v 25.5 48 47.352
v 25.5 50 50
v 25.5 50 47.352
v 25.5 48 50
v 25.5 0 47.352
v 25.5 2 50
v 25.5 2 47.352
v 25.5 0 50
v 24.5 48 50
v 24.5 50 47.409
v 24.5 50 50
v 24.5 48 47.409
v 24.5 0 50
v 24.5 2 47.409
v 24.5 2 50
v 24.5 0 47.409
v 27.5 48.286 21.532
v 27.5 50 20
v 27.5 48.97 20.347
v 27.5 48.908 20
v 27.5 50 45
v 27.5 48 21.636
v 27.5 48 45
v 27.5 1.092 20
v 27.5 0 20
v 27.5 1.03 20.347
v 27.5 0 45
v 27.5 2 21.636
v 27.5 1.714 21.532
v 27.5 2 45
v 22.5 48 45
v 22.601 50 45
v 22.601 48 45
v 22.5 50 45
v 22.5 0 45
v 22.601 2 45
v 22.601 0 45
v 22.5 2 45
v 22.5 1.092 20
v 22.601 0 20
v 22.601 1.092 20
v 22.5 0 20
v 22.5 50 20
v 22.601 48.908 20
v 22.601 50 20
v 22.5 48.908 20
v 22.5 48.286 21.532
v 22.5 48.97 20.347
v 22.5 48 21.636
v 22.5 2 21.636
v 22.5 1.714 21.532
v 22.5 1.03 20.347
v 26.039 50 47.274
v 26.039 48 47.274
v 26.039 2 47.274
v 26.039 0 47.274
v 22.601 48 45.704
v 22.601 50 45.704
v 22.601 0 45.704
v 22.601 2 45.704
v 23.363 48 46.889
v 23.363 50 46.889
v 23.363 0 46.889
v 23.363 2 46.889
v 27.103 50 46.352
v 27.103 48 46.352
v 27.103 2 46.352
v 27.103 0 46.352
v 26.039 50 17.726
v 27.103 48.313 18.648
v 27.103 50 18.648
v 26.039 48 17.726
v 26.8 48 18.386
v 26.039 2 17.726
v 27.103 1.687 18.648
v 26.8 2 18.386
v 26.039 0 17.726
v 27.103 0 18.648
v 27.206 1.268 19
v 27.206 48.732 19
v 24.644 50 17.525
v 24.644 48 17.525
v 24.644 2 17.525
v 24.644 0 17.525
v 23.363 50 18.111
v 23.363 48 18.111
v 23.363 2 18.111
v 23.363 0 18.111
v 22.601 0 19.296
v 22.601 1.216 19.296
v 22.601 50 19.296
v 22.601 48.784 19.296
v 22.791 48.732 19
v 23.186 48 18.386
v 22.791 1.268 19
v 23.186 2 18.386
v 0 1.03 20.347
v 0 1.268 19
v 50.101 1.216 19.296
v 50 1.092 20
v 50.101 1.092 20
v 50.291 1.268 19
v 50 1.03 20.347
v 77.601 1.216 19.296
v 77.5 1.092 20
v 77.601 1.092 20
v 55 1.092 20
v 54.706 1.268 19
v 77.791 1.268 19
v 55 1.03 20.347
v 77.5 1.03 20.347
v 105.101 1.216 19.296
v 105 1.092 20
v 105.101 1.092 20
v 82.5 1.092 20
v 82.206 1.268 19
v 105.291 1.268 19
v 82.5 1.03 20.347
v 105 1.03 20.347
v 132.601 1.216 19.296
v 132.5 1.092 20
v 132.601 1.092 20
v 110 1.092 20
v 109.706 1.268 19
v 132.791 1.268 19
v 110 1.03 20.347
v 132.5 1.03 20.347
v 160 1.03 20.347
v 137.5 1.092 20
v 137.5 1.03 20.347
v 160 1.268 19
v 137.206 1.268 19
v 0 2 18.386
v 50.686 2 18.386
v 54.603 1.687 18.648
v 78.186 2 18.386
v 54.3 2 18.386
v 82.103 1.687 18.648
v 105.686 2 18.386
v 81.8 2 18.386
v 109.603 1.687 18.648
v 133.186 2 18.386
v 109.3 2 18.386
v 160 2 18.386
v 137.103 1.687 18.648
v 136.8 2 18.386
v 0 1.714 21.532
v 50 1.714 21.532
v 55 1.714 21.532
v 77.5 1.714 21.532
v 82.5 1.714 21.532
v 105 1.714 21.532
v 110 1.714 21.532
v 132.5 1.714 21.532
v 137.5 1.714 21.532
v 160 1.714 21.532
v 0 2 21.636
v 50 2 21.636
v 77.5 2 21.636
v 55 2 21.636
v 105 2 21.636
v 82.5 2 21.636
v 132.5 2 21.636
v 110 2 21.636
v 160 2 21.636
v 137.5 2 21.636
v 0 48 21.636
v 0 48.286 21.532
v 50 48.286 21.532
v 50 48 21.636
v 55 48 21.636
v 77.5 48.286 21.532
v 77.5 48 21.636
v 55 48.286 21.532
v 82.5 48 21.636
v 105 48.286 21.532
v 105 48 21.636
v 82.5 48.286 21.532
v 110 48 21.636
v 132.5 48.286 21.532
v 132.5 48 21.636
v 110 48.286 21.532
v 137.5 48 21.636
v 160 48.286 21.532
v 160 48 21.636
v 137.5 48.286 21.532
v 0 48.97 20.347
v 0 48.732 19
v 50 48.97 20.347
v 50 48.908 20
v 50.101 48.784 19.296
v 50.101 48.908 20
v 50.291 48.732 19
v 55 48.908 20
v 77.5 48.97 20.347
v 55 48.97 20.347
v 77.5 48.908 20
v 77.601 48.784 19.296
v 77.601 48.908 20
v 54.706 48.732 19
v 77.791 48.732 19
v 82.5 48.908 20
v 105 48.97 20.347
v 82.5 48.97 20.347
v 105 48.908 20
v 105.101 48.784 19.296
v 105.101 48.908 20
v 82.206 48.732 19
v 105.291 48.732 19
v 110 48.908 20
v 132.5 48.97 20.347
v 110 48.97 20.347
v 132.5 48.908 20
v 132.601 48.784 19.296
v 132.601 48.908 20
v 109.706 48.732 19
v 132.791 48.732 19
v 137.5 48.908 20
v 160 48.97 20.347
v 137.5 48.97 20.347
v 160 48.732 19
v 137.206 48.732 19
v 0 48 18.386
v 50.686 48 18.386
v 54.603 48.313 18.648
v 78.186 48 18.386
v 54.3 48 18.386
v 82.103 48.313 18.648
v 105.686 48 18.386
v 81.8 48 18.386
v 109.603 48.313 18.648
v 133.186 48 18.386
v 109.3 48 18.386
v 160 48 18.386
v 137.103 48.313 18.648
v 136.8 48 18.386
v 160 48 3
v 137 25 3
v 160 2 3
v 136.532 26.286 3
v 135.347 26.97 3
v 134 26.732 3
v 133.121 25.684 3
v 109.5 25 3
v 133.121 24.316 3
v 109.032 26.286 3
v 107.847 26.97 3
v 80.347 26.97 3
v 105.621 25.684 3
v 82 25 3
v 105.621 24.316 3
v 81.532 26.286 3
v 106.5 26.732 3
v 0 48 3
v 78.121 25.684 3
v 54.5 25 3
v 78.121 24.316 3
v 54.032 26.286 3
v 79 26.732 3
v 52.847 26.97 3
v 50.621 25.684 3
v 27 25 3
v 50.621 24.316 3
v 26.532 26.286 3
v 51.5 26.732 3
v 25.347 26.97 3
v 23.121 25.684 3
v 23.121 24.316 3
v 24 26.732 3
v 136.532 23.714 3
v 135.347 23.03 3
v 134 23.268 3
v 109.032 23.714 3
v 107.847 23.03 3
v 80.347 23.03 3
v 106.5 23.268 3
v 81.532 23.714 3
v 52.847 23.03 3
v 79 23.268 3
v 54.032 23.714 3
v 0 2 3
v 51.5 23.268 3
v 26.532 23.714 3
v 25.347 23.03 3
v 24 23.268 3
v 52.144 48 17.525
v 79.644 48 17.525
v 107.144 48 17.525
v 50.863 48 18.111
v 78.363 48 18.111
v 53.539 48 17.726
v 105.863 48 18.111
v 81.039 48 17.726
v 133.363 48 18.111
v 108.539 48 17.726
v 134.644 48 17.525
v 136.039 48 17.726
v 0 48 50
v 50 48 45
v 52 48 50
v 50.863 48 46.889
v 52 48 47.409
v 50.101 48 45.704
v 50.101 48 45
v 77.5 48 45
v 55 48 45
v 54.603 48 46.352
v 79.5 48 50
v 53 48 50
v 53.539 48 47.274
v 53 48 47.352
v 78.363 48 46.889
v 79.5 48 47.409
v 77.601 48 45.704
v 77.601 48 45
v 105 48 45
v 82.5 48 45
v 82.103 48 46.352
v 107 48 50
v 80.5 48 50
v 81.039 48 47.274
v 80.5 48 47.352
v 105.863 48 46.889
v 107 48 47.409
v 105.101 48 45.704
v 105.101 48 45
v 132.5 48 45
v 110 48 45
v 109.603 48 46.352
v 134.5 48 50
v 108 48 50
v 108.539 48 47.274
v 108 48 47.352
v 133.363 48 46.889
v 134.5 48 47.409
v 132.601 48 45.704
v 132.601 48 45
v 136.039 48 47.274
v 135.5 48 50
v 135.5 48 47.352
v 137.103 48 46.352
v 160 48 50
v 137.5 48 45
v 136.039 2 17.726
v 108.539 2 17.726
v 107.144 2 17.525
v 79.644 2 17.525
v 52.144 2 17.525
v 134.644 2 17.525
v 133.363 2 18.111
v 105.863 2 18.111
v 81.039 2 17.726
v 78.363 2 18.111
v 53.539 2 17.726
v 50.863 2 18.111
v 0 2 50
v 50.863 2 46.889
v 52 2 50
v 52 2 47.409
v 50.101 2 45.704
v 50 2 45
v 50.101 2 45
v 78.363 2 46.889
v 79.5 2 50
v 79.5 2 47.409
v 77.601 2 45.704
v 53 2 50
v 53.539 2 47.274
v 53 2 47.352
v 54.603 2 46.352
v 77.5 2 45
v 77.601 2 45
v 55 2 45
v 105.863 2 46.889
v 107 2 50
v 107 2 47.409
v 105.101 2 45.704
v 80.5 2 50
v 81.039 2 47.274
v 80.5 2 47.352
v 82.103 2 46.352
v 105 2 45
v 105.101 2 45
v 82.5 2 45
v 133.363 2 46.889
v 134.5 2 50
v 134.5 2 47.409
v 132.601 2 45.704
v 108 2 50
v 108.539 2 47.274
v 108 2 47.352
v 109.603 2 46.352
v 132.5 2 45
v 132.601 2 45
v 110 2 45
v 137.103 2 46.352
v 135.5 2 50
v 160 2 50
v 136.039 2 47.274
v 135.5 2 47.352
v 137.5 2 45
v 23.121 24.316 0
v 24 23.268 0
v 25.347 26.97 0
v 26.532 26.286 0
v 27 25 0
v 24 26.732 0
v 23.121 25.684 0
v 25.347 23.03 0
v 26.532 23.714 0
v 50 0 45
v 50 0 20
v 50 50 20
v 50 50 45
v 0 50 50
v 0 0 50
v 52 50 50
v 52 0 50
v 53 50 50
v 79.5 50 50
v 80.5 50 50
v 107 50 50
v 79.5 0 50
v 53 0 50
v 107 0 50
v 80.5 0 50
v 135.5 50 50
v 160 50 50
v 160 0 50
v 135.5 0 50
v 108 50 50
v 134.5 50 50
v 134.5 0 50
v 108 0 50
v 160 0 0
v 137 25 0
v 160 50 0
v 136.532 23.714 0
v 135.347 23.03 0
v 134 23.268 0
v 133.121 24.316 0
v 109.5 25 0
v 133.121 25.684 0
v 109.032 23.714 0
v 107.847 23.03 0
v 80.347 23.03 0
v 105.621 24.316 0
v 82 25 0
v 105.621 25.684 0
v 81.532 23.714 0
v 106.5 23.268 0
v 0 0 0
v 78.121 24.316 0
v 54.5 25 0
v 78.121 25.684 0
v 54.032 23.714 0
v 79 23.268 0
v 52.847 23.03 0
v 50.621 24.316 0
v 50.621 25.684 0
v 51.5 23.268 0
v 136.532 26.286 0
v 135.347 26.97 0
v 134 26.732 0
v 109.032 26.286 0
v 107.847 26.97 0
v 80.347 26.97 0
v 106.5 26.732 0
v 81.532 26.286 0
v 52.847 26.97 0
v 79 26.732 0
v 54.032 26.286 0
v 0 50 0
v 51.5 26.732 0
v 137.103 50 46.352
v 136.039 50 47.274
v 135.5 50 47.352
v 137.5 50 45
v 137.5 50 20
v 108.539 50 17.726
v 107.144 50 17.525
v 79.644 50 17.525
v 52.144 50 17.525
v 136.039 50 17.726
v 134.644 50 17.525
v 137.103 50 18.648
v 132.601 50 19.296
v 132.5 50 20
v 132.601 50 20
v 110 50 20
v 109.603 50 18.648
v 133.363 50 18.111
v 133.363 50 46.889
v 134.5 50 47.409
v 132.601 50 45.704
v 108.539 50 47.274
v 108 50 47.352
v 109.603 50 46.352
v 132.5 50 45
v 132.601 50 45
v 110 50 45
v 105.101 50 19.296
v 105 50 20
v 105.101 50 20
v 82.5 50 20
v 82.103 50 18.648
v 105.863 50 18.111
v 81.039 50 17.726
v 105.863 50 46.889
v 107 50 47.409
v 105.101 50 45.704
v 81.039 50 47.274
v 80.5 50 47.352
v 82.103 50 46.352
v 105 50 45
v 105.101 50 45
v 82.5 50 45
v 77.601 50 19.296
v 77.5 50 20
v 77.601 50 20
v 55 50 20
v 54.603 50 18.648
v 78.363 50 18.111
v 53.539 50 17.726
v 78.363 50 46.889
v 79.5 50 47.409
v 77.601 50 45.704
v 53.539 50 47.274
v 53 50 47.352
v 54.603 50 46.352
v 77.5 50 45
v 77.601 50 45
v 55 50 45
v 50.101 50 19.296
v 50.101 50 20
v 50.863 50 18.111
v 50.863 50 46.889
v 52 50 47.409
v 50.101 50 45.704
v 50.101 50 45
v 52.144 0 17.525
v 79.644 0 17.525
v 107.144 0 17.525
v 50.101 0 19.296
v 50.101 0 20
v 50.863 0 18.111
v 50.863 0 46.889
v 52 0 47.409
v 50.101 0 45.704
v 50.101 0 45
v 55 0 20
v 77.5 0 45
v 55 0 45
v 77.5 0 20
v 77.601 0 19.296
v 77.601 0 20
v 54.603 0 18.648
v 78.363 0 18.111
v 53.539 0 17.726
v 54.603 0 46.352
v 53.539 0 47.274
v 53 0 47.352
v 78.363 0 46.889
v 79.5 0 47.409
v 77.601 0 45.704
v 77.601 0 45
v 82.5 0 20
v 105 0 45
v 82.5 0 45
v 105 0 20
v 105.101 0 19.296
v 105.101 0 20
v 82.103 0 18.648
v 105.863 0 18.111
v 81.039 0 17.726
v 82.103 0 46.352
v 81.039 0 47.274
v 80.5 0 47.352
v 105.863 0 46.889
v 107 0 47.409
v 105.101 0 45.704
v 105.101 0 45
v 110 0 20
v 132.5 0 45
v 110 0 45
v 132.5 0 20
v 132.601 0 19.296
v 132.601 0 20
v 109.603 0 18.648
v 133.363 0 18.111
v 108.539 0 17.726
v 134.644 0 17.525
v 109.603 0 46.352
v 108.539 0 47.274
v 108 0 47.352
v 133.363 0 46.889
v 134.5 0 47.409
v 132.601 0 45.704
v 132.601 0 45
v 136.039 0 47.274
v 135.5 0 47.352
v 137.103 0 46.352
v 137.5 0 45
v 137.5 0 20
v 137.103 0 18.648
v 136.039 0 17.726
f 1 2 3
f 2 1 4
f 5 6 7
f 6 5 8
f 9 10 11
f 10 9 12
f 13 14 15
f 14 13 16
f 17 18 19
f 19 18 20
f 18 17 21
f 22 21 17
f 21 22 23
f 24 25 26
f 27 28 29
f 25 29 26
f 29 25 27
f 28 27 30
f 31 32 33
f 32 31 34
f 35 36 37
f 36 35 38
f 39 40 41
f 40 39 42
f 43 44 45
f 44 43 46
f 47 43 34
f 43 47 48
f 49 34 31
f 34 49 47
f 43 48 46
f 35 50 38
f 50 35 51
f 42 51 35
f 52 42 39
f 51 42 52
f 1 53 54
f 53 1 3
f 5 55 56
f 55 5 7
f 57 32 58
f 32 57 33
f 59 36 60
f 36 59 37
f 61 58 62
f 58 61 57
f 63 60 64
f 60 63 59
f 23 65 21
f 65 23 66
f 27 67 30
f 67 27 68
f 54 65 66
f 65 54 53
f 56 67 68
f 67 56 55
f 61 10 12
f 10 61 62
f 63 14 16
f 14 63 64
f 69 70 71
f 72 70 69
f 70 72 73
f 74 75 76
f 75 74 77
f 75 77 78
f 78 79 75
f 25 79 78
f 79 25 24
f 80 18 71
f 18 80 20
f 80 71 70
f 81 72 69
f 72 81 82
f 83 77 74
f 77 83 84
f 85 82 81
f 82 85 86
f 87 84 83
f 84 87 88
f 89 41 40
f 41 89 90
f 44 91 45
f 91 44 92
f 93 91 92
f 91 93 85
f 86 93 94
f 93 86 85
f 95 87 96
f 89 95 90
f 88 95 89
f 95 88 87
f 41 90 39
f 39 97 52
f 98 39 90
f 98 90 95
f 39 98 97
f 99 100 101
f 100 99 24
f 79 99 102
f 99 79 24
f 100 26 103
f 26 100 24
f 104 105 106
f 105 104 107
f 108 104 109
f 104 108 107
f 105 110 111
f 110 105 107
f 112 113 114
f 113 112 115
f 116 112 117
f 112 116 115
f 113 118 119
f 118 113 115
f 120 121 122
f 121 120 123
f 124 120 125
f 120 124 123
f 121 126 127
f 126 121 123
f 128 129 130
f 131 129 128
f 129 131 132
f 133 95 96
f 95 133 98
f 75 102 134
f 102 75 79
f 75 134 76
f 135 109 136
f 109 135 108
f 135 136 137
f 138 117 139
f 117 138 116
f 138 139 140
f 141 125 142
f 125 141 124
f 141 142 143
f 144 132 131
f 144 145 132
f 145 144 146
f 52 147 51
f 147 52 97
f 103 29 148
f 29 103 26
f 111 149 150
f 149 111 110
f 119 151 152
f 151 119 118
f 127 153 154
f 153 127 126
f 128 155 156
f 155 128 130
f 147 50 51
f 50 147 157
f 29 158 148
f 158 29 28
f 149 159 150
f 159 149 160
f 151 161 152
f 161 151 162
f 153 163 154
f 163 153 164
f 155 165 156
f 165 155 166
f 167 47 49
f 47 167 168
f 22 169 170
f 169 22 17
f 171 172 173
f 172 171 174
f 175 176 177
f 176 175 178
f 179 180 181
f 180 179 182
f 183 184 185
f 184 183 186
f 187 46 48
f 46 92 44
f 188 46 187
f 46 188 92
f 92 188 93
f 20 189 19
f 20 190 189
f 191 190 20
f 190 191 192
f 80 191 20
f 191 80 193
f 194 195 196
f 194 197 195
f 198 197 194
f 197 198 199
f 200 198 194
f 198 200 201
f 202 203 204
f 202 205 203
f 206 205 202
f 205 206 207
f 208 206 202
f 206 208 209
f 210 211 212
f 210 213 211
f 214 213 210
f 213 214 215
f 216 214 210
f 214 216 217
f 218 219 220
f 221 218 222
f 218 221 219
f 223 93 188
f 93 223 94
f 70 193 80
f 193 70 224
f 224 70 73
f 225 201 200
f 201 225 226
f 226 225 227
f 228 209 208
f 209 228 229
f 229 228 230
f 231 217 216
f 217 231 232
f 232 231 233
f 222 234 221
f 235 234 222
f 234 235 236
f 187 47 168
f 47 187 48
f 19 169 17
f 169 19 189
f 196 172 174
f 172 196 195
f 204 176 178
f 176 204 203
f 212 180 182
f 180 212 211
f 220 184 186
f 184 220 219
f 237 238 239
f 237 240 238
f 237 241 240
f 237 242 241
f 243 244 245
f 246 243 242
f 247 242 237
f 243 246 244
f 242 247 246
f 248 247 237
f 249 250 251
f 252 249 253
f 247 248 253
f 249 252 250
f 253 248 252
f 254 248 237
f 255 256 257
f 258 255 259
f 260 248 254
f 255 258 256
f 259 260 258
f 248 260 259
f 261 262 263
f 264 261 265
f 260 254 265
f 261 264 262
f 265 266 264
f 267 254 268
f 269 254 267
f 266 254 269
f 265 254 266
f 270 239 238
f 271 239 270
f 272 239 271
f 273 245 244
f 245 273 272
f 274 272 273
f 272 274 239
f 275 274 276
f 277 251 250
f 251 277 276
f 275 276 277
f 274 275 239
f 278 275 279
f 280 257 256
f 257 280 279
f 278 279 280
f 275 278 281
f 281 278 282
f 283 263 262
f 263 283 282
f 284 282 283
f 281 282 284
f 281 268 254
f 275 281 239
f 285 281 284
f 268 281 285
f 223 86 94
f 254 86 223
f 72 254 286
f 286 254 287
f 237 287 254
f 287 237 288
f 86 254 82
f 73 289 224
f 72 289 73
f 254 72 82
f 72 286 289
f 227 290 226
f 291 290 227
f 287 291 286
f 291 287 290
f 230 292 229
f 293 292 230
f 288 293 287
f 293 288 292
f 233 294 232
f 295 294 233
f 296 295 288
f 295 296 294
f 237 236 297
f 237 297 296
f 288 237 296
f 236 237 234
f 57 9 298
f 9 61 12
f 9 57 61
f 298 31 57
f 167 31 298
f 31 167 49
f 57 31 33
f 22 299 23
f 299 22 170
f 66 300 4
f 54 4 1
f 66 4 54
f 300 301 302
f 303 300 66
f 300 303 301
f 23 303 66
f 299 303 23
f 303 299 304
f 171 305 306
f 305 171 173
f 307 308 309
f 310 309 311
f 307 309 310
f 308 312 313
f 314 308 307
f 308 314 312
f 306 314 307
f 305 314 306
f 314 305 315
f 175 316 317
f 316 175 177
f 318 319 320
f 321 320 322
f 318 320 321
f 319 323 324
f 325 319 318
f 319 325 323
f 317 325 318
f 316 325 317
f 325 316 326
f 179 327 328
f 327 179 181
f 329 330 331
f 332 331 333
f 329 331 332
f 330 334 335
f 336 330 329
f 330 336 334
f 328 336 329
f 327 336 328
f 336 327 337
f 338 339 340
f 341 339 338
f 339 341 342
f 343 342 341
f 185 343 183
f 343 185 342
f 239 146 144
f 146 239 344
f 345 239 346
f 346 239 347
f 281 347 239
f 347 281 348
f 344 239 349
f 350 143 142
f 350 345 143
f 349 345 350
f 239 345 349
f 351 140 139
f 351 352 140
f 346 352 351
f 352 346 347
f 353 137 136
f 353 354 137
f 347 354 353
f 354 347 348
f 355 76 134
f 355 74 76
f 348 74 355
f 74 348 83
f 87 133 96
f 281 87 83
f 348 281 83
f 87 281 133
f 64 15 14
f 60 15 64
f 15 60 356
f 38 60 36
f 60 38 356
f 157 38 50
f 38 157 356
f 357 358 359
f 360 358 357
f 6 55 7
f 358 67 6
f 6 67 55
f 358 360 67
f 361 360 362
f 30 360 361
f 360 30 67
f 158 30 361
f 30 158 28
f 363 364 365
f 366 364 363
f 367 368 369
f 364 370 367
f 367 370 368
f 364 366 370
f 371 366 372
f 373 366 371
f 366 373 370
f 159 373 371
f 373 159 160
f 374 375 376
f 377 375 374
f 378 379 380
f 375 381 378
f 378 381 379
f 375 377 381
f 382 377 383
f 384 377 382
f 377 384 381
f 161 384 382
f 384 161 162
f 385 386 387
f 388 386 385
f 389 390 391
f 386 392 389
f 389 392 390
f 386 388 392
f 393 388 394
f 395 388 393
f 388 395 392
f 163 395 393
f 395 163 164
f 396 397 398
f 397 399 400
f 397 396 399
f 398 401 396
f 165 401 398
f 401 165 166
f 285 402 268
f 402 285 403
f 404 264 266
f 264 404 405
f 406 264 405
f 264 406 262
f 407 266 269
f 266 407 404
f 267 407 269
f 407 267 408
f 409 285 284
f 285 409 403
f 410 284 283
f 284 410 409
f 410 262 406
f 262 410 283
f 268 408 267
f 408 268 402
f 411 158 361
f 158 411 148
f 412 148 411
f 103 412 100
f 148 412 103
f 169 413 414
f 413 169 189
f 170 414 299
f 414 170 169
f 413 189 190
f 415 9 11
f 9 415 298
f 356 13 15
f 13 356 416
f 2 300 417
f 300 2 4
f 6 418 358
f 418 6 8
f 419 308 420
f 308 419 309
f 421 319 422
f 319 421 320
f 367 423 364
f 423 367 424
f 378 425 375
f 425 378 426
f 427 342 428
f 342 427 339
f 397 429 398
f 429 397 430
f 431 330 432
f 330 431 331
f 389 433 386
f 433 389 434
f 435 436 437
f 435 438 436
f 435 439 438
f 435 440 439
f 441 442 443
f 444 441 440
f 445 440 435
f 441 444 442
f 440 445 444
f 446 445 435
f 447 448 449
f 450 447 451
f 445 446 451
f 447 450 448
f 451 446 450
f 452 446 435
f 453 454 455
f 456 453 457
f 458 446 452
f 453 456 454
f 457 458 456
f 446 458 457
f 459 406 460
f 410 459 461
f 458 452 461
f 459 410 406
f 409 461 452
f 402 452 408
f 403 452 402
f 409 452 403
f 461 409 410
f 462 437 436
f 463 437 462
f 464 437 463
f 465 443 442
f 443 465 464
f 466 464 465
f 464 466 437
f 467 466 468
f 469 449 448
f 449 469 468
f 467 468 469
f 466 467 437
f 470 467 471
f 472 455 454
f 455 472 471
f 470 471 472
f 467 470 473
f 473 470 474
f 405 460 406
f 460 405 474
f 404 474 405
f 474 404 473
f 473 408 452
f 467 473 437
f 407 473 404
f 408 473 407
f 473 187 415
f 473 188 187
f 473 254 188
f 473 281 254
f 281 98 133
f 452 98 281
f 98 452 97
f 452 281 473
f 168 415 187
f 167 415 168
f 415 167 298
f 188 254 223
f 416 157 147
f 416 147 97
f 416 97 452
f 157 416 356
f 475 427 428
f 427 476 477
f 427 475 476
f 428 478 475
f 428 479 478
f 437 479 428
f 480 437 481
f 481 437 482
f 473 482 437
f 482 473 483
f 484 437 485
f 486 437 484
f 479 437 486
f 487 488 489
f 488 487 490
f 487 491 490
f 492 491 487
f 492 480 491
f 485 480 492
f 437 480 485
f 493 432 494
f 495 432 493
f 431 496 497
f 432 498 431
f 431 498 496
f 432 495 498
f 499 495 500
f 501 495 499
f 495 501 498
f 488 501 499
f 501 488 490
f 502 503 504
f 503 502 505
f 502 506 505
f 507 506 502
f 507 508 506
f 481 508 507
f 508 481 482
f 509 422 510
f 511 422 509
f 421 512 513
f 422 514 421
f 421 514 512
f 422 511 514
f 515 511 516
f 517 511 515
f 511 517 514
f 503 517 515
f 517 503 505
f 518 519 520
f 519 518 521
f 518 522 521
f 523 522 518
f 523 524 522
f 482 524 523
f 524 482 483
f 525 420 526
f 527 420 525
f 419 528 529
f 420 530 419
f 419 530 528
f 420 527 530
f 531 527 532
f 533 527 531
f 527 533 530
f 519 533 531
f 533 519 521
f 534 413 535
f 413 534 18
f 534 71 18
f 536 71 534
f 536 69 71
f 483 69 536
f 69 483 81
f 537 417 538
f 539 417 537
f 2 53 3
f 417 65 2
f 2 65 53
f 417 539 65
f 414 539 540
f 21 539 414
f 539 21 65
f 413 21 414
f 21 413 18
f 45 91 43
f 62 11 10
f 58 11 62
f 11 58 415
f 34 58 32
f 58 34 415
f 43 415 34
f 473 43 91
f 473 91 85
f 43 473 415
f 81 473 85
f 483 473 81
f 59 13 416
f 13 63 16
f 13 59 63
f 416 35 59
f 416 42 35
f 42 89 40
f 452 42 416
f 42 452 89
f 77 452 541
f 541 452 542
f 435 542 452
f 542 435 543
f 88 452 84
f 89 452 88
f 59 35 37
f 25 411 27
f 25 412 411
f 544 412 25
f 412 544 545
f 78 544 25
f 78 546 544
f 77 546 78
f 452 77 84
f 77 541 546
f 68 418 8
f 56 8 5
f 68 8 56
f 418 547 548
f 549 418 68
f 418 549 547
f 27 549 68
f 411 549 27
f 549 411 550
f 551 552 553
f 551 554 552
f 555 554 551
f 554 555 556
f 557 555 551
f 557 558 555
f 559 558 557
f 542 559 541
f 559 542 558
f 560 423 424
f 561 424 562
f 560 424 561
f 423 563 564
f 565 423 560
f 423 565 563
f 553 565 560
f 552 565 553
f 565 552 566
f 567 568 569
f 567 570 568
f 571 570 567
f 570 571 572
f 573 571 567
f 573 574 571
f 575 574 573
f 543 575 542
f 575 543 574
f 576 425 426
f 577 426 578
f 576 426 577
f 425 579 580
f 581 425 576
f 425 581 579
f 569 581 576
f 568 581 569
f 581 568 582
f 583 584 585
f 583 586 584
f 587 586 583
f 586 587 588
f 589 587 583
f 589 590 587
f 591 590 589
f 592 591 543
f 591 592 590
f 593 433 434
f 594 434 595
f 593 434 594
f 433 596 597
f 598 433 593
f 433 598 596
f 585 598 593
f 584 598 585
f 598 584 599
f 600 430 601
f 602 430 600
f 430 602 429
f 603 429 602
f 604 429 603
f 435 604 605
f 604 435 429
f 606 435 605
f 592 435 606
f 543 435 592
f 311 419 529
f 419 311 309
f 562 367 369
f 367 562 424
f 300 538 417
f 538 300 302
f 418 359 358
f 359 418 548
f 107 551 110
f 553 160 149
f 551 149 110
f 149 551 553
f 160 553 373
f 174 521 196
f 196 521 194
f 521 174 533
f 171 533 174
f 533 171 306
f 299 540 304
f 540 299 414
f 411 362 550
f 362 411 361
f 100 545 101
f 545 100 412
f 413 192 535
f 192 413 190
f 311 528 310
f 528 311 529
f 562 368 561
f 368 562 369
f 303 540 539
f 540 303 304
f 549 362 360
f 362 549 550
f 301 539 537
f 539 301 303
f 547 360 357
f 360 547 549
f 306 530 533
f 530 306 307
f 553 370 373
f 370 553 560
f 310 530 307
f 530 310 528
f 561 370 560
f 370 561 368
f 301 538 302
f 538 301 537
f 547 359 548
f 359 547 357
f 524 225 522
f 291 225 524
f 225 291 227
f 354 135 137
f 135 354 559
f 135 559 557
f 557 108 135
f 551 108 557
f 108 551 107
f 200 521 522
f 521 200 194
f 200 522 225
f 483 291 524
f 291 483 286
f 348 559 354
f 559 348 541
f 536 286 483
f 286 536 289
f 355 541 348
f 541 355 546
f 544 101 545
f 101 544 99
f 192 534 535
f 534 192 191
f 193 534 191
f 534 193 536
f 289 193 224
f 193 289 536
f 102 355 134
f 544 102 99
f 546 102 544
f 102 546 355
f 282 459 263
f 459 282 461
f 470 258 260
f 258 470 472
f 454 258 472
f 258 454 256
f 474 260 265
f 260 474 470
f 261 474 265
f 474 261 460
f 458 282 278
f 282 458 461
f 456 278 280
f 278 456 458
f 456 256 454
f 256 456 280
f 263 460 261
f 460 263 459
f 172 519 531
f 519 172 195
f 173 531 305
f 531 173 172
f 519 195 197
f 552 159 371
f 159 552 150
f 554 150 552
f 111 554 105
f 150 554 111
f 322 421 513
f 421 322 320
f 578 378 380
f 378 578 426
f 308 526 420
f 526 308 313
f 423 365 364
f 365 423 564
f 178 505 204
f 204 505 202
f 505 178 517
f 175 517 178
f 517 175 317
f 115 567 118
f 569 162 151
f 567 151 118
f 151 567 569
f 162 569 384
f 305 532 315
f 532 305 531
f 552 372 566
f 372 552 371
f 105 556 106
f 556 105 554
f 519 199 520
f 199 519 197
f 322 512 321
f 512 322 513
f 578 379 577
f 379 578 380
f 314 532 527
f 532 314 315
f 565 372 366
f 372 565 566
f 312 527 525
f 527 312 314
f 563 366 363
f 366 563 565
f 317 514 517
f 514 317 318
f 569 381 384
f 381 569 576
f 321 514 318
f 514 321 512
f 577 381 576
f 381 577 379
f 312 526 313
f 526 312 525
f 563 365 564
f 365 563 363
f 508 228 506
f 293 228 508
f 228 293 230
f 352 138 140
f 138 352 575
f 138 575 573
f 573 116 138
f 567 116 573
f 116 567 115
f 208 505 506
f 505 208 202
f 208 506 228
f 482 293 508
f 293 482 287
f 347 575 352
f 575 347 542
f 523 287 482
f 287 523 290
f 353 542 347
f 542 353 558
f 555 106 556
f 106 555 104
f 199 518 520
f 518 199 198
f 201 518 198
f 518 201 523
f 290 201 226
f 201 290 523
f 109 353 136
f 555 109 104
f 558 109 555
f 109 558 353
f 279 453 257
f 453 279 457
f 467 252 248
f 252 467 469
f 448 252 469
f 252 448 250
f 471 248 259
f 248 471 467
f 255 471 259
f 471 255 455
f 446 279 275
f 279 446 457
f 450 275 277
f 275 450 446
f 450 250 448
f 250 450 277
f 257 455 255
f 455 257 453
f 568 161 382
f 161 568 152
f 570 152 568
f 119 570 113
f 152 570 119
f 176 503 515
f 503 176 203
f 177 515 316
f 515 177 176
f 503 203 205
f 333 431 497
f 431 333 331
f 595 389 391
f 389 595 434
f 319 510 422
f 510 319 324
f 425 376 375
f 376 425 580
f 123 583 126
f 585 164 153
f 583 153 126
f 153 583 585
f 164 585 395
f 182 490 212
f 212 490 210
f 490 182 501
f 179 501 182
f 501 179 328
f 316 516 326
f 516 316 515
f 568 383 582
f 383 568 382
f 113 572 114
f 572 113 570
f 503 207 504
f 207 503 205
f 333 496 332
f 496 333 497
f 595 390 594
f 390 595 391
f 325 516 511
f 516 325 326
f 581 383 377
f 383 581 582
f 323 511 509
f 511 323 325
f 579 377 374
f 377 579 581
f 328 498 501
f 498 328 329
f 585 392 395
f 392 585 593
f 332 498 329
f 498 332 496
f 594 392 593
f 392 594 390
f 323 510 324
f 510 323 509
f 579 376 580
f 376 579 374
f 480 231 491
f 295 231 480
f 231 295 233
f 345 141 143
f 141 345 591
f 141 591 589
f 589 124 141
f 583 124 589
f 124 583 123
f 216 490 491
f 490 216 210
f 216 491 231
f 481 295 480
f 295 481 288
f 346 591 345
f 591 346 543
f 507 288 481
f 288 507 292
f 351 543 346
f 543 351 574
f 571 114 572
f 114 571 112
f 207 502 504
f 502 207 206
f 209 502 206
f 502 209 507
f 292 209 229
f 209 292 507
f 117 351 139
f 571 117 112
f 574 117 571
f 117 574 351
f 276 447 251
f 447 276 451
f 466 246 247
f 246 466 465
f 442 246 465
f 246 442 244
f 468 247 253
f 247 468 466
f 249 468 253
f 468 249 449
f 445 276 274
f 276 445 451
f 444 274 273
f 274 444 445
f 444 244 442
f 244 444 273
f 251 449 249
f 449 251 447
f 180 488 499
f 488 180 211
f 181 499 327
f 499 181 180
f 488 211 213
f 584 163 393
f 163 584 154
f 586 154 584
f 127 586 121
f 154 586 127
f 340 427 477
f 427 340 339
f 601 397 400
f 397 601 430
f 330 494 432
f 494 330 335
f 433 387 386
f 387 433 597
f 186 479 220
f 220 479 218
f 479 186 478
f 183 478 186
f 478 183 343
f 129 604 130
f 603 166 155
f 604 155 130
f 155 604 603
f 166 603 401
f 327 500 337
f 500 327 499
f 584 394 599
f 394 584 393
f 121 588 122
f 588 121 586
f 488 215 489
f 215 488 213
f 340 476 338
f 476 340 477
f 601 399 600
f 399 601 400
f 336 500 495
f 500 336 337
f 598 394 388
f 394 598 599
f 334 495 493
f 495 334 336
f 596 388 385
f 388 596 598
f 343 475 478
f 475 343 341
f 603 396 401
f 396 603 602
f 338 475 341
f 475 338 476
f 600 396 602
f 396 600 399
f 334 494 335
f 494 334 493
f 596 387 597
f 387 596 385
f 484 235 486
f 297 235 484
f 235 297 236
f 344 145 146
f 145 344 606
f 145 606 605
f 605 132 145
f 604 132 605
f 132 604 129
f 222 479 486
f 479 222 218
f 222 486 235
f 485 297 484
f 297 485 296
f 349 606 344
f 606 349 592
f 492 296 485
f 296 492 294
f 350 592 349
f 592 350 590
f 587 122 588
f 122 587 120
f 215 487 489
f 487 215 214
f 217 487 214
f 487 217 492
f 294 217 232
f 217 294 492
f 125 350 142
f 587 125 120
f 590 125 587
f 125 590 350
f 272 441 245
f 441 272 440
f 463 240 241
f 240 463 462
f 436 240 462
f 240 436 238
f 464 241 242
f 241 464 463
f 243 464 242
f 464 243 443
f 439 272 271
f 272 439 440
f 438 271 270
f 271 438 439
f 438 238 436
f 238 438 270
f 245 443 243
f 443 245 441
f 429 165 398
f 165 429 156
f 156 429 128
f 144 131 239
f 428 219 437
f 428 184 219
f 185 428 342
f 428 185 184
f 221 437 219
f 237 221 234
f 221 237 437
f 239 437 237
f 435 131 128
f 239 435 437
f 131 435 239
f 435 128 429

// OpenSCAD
$fa=1.5;
$fs=1.5;

module slot_carve_out(offset=0, length=25, width=25, height=25, walls=2, floor=3, slot_height=15, slot_width=5)
{
	tslot_height=slot_height-slot_width;

    relief_height=5+(slot_width/2);
    translate([offset+(length/2)-0.5,-1,height-(relief_height-1)])
        cube([1,width+2,relief_height]);
    translate([offset+(length/2)-(slot_width/2),-1,((height-5)-(tslot_height))])
        cube([slot_width,width+2,tslot_height]);
    translate([offset+length/2, -1, height-5])
        rotate([-90,0,0])
            cylinder(h=width+2, r=slot_width/2);
    translate([offset+length/2, -1, (height-(5+tslot_height))])
        rotate([-90,0,0])
            cylinder(h=width+2, r=slot_width/2);
}

module wall_relief(offset=0, length=25, width=25, height=25, walls=2, floor=3, slot_height=15, slot_width=5)
{
    union()
    {
        translate([offset+length+1, walls+(walls/2), height-slot_height])
            rotate([0,-90,0])
                cylinder(h=length+2, r=walls);
        translate([offset+length+1, width-(walls+walls/2), height-slot_height])
            rotate([0,-90,0])
                cylinder(h=length+2, r=walls);
    }
}

module mounting_hole(offset=0, length=25, width=25, floor=3, screw_size)
{
    translate([offset+(length/2), width/2, -1])
        cylinder(h=floor+2, r=screw_size);
}

module slot_segment(offset=0, length=25, width=25, height=25, walls=2, floor=3, slot_height=15, slot_width=5)
{
	    difference()
	    {
			translate([offset,0,0])
                cube([length,width,height]);
            union()
            {
                translate([offset-1,walls,floor])
                    cube([length+2,width-(walls*2),height]);
                slot_carve_out(offset, length, width, height, walls, floor, slot_height, slot_width);
                wall_relief(offset, length, width, height, walls, floor, slot_height, slot_width);
                mounting_hole(offset, length, width, height, walls, floor, 3);

            }
        }
}

length=50;
width=50;
height=50;
walls=2;
floor=3;
slot_height=30;
slot_width=5;
for(i = [0:1:4]) {
	offset = i*((length/2)+(slot_width/2));
	slot_segment(offset, length, width, height, walls, floor, slot_height, slot_width);
}
